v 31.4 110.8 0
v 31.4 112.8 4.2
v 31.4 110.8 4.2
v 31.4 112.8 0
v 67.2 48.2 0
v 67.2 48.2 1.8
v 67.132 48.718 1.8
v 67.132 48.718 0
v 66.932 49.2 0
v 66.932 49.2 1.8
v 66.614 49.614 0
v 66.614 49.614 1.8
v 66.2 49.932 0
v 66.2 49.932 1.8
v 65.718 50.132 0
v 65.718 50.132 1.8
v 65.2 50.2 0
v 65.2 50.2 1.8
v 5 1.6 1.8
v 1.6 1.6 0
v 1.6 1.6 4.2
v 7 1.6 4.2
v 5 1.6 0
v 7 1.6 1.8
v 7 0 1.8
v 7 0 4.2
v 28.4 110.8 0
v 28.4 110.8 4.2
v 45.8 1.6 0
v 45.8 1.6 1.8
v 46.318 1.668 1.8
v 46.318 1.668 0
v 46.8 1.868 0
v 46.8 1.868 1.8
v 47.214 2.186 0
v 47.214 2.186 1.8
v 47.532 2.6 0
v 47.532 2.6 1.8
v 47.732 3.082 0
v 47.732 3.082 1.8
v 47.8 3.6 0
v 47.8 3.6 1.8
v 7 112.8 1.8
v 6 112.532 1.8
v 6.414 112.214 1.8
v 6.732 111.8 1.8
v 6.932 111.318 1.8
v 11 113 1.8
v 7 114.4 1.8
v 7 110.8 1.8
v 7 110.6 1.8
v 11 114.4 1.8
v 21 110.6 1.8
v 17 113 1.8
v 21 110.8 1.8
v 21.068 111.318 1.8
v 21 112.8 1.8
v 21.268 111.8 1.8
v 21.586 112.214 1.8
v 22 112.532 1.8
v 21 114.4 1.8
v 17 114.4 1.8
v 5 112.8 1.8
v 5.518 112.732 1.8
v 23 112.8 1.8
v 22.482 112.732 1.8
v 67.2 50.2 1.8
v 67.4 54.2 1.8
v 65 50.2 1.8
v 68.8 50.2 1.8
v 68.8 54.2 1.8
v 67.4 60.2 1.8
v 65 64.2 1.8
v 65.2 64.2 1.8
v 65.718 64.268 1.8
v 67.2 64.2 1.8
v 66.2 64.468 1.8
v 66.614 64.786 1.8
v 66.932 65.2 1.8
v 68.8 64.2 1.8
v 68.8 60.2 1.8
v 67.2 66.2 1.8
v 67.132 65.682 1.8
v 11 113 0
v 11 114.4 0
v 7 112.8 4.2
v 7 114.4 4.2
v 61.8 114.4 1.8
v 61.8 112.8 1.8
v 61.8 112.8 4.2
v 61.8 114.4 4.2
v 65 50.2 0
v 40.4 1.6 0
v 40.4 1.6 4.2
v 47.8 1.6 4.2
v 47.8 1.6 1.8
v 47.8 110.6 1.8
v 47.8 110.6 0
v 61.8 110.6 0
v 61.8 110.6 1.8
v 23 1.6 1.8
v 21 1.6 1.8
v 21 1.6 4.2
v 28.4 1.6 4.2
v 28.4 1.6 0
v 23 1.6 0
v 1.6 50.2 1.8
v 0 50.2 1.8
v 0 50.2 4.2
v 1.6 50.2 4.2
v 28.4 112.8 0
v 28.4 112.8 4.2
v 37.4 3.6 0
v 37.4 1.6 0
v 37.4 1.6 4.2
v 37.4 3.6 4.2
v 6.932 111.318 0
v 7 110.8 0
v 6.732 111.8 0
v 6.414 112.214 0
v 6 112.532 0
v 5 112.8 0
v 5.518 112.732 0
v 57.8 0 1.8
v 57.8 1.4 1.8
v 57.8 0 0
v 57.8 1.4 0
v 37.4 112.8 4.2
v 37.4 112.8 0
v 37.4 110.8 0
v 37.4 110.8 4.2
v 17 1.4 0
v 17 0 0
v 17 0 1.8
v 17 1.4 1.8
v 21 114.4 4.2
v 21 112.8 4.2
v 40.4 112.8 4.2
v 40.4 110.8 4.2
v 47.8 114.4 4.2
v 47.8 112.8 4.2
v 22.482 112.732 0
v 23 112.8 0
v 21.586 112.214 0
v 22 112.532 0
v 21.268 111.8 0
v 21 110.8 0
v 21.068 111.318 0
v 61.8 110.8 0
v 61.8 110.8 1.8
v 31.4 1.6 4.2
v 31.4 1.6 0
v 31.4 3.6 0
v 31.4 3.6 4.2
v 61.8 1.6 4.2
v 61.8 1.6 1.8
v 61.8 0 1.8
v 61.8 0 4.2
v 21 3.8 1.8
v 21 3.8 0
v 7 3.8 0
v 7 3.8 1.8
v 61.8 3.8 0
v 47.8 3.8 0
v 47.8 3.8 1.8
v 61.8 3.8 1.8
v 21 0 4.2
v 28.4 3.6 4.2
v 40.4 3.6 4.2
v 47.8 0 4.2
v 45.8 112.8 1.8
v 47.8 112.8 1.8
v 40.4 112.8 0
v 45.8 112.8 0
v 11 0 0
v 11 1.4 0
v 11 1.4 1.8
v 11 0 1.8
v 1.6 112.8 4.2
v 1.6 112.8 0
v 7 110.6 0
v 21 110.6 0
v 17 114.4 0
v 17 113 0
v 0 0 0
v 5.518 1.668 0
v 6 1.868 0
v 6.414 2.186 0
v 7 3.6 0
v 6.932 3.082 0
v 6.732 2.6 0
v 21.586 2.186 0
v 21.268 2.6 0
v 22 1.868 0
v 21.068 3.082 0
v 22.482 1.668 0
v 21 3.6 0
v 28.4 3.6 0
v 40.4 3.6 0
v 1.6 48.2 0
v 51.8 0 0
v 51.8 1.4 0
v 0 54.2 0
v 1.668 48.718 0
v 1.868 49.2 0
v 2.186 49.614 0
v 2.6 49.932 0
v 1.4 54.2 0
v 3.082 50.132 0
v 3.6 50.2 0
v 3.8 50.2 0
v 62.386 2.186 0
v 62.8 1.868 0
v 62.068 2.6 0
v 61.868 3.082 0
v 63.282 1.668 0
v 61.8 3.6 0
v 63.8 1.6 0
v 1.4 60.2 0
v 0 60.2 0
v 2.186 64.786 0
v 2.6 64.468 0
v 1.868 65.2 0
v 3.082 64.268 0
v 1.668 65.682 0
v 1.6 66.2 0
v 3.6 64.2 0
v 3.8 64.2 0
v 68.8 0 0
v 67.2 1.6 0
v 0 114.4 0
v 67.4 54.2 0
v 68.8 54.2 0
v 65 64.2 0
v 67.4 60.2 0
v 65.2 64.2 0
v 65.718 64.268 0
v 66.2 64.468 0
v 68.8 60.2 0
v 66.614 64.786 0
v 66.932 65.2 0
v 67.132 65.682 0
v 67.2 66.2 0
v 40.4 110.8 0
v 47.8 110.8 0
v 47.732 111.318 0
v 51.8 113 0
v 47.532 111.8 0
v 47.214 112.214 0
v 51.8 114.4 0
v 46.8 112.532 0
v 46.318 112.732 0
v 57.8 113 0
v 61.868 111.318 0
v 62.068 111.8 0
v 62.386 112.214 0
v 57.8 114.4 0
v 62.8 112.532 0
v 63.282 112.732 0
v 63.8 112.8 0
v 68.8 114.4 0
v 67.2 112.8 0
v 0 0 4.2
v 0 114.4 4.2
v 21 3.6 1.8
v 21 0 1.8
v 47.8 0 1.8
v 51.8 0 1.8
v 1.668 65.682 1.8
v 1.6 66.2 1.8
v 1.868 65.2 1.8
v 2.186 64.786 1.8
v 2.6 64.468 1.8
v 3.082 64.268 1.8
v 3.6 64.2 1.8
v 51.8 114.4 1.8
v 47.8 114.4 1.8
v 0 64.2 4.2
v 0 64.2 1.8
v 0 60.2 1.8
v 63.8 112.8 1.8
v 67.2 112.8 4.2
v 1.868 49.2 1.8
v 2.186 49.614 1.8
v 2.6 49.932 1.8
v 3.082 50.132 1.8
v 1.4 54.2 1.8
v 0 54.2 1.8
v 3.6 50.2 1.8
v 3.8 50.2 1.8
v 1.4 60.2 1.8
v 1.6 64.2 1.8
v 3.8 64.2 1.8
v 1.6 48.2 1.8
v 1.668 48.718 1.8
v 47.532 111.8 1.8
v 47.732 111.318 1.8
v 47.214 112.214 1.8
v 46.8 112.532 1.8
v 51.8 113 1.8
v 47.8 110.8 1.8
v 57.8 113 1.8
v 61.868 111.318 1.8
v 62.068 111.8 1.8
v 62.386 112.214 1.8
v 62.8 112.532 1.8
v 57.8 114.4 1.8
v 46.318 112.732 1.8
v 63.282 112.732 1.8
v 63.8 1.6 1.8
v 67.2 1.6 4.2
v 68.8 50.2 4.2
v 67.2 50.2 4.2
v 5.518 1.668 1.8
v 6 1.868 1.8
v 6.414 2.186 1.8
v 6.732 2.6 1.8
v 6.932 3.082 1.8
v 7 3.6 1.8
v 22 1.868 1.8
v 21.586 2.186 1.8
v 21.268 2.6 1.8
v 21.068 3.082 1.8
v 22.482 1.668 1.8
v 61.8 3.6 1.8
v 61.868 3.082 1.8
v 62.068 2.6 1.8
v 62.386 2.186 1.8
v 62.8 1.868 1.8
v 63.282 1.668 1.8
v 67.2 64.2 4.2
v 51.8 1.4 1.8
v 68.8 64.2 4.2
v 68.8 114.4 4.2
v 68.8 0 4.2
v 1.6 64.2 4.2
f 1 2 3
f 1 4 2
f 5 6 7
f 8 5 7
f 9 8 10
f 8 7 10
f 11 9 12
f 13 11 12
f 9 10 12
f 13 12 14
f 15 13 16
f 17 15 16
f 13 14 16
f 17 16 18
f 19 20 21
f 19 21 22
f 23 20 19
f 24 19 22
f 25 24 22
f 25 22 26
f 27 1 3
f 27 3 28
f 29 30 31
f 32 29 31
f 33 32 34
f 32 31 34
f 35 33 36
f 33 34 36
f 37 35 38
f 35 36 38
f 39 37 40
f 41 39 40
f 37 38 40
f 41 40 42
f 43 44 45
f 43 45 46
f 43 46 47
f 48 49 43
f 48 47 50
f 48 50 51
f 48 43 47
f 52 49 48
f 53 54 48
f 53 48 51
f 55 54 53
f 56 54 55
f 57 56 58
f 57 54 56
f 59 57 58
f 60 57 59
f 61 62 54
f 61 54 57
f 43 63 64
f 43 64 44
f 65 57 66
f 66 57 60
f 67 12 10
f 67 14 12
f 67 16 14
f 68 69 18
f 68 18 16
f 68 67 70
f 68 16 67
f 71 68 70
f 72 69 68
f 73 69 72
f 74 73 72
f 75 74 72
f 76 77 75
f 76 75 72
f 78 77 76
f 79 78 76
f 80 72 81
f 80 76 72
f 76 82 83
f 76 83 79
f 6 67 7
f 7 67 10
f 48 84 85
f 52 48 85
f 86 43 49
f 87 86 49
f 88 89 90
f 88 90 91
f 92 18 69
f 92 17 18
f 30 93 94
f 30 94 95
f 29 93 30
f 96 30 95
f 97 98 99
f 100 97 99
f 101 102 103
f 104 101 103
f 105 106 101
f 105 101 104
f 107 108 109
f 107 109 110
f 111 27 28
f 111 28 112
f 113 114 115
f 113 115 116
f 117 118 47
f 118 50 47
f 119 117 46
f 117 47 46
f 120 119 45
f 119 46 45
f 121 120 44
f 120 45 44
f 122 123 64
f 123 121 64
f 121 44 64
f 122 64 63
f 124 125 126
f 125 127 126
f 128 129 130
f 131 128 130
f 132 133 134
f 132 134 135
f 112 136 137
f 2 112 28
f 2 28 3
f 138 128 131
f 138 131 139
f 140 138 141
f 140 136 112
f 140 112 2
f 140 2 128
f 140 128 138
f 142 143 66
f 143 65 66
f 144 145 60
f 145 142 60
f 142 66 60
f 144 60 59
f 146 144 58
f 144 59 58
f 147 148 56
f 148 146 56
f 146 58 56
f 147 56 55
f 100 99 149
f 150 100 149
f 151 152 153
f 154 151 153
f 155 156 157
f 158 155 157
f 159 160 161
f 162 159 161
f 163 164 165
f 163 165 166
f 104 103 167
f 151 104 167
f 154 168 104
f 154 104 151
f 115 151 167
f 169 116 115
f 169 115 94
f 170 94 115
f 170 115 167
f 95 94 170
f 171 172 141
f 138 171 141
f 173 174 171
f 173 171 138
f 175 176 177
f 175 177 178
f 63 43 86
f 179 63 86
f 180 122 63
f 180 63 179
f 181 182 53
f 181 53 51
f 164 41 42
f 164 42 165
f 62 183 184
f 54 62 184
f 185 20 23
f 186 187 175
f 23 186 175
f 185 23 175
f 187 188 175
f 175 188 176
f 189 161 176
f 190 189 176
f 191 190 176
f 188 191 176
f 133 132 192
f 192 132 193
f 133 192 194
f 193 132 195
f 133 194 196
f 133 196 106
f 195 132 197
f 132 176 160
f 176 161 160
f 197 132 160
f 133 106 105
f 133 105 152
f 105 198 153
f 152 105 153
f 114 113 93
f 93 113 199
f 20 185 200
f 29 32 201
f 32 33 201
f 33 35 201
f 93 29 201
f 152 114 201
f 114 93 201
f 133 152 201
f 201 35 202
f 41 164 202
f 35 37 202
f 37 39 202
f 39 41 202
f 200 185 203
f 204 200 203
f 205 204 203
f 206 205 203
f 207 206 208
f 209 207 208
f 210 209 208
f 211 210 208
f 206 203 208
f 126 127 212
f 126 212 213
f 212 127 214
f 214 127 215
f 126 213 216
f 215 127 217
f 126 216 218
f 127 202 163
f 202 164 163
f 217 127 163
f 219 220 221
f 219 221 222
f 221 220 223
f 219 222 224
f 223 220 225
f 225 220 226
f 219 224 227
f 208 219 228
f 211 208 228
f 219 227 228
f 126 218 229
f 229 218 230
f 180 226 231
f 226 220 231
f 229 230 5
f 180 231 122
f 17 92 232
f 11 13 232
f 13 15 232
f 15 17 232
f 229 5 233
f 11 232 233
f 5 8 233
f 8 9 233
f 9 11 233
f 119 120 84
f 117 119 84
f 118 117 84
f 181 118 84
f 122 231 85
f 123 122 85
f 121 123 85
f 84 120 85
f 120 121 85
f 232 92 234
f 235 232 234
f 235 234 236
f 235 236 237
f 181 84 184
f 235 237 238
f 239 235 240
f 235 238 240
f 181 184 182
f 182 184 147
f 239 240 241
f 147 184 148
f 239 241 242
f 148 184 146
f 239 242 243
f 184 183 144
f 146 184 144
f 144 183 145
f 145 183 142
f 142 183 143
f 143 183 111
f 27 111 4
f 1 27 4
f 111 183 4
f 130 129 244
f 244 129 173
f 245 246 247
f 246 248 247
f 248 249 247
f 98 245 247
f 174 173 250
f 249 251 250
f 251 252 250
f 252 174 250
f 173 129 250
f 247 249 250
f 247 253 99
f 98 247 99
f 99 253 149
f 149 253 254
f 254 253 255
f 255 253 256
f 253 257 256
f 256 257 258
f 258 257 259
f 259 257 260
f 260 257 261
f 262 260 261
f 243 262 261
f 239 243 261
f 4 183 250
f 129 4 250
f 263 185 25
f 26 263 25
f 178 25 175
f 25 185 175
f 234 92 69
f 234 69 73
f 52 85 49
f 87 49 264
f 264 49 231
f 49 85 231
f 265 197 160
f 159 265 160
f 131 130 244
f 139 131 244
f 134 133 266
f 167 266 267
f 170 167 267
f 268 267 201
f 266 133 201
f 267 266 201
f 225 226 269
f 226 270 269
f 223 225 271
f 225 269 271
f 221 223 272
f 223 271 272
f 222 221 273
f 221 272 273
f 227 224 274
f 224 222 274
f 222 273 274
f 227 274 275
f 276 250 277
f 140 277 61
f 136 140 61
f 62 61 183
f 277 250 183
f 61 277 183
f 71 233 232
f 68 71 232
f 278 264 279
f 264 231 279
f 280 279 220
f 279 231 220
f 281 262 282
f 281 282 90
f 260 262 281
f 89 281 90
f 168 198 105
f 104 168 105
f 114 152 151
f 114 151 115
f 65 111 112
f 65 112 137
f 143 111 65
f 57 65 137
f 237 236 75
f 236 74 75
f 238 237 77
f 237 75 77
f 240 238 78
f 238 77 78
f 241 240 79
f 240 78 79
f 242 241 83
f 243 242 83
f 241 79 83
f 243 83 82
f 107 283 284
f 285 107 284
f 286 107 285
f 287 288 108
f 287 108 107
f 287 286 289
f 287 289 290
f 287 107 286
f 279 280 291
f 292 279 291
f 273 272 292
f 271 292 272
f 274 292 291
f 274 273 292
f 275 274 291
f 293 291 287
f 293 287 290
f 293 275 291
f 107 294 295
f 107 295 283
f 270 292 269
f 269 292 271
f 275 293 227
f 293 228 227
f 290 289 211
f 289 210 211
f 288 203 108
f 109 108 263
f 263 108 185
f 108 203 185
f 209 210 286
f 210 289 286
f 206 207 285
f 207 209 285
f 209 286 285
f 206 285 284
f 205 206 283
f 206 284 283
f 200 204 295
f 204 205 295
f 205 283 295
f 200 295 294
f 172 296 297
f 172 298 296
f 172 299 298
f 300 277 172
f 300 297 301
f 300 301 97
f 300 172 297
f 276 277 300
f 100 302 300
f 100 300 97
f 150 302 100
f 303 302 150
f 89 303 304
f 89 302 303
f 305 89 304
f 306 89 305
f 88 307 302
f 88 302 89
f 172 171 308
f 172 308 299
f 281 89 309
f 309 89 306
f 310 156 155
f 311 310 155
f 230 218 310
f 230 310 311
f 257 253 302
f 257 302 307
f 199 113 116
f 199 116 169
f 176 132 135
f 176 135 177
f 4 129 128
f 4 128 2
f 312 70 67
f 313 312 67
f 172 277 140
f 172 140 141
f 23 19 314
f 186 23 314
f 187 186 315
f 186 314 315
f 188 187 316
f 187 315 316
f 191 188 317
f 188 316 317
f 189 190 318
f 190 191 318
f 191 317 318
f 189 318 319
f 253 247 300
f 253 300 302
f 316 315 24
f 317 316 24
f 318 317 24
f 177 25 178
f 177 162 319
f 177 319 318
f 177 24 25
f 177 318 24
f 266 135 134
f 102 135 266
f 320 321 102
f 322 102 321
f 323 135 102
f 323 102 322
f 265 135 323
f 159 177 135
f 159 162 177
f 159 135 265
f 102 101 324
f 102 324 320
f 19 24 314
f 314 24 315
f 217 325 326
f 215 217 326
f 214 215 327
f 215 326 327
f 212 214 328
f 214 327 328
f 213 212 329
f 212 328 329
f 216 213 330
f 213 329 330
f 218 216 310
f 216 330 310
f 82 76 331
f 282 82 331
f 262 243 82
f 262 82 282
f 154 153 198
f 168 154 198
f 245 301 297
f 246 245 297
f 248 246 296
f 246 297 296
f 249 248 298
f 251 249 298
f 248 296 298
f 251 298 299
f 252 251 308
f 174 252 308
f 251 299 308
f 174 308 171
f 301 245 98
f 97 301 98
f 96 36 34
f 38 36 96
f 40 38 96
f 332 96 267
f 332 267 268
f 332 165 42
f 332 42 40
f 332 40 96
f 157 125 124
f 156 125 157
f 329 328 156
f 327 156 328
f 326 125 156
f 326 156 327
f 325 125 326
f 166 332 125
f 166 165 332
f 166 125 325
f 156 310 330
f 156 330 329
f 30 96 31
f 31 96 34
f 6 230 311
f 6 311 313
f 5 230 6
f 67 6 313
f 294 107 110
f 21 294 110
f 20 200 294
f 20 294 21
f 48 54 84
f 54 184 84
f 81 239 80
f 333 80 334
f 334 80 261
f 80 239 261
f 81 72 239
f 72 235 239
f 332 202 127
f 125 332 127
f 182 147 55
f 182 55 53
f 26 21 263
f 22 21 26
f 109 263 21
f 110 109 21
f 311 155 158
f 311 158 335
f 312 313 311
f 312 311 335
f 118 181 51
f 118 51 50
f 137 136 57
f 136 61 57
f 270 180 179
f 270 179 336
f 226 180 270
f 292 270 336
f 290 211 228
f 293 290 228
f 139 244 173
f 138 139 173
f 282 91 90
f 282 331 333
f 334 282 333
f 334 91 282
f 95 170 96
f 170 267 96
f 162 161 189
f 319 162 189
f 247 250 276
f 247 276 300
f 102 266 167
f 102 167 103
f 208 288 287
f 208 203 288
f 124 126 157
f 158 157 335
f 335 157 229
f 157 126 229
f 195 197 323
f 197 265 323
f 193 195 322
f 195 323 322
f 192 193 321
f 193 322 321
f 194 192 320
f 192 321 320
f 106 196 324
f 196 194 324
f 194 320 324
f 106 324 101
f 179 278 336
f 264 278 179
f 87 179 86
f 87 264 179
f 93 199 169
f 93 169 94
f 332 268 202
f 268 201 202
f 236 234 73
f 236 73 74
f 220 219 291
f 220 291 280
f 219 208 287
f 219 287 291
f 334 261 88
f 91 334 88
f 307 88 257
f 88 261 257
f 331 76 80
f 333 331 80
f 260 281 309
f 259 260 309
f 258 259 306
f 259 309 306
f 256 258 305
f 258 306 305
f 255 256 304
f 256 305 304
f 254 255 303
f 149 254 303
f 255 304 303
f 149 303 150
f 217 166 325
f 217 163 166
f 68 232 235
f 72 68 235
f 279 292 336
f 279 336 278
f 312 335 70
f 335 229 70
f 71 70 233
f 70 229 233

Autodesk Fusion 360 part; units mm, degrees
sketch "Sketch1" plane through (0, 0, 0) normal (0, 0, 1) x (1, 0, 0)
  line L0 (21, 0) -> (21, 3.8)
  line L1 (21, 3.8) -> (7, 3.8)
  line L2 (7, 3.8) -> (7, 0)
  line L3 (17, 0) -> (17, 1.4)
  line L4 (17, 1.4) -> (11, 1.4)
  line L5 (11, 1.4) -> (11, 0)
  line L6 (0, 57.2) -> (68.8, 57.2) construction
  line L7 (34.4, 114.4) -> (34.4, 0) construction
  line L8 (47.8, 0) -> (47.8, 3.8)
  line L9 (47.8, 3.8) -> (61.8, 3.8)
  line L10 (61.8, 3.8) -> (61.8, 0)
  line L11 (51.8, 1.4) -> (57.8, 1.4)
  line L12 (57.8, 1.4) -> (57.8, 0)
  line L13 (51.8, 0) -> (51.8, 1.4)
  line L14 (7, 110.6) -> (7, 114.4)
  line L15 (21, 110.6) -> (7, 110.6)
  line L16 (21, 114.4) -> (21, 110.6)
  line L17 (17, 113) -> (11, 113)
  line L18 (11, 113) -> (11, 114.4)
  line L19 (17, 114.4) -> (17, 113)
  line L20 (47.8, 114.4) -> (47.8, 110.6)
  line L21 (47.8, 110.6) -> (61.8, 110.6)
  line L22 (51.8, 113) -> (57.8, 113)
  line L23 (51.8, 114.4) -> (51.8, 113)
  line L24 (57.8, 113) -> (57.8, 114.4)
  line L25 (61.8, 110.6) -> (61.8, 114.4)
  line L26 (68.8, 54.2) -> (67.4, 54.2)
  line L27 (67.4, 54.2) -> (67.4, 60.2)
  line L28 (67.4, 60.2) -> (68.8, 60.2)
  line L29 (68.8, 50.2) -> (65, 50.2)
  line L30 (65, 50.2) -> (65, 64.2)
  line L31 (65, 64.2) -> (68.8, 64.2)
  line L32 (3.8, 64.2) -> (0, 64.2)
  line L33 (3.8, 50.2) -> (3.8, 64.2)
  line L34 (0, 50.2) -> (3.8, 50.2)
  line L35 (0, 54.2) -> (1.4, 54.2)
  line L36 (1.4, 54.2) -> (1.4, 60.2)
  line L37 (1.4, 60.2) -> (0, 60.2)
  line L38 (7, 0) -> (11, 0)
  line L39 (17, 0) -> (21, 0)
  line L40 (0, 0) -> (11, 0)
  line L41 (17, 0) -> (51.8, 0)
  line L42 (57.8, 0) -> (68.8, 0)
  line L43 (68.8, 0) -> (68.8, 54.2)
  line L44 (68.8, 60.2) -> (68.8, 114.4)
  line L45 (68.8, 64.2) -> (68.8, 60.2)
  line L46 (68.8, 54.2) -> (68.8, 50.2)
  line L47 (0, 114.4) -> (0, 60.2)
  line L48 (0, 54.2) -> (0, 0)
  line L49 (11, 114.4) -> (0, 114.4)
  line L50 (68.8, 114.4) -> (57.8, 114.4)
  line L51 (51.8, 114.4) -> (17, 114.4)
  line L52 (18.6, 1.6) -> (50.2, 1.6)
  line L53 (50.2, 1.6) -> (50.2, 3)
  line L54 (50.2, 3) -> (59.4, 3)
  line L55 (59.4, 3) -> (59.4, 1.6)
  line L56 (59.4, 1.6) -> (67.2, 1.6)
  line L57 (67.2, 1.6) -> (67.2, 52.6)
  line L58 (67.2, 52.6) -> (65.8, 52.6)
  line L59 (65.8, 52.6) -> (65.8, 61.8)
  line L60 (65.8, 61.8) -> (67.2, 61.8)
  line L61 (67.2, 61.8) -> (67.2, 112.8)
  line L62 (67.2, 112.8) -> (59.4, 112.8)
  line L63 (18.6, 1.6) -> (18.6, 3)
  line L64 (18.6, 3) -> (9.4, 3)
  line L65 (9.4, 3) -> (9.4, 1.6)
  line L66 (8.5, 1.6) -> (9.4, 1.6)
  line L67 (1.6, 52.6) -> (1.6, 1.6)
  line L68 (1.6, 1.6) -> (9.4, 1.6)
  line L69 (1.6, 52.6) -> (3, 52.6)
  line L70 (3, 52.6) -> (3, 61.8)
  line L71 (3, 61.8) -> (1.6, 61.8)
  line L72 (1.6, 112.8) -> (1.6, 61.8)
  line L73 (67.2, 112.8) -> (59.4, 112.8)
  line L74 (59.4, 111.4) -> (59.4, 112.8)
  line L75 (50.2, 111.4) -> (59.4, 111.4)
  line L76 (50.2, 112.8) -> (50.2, 111.4)
  line L77 (50.2, 112.8) -> (18.6, 112.8)
  line L78 (18.6, 112.8) -> (18.6, 111.4)
  line L79 (18.6, 111.4) -> (9.4, 111.4)
  line L80 (9.4, 111.4) -> (9.4, 112.8)
  line L81 (9.4, 112.8) -> (1.6, 112.8)
  line L82 (22.6, 114.4) -> (22.6, 109)
  line L83 (22.6, 109) -> (5.4, 109)
  line L84 (5.4, 109) -> (5.4, 114.4)
  line L85 (46.2, 114.4) -> (46.2, 109)
  line L86 (46.2, 109) -> (63.4, 109)
  line L87 (63.4, 109) -> (63.4, 114.4)
  line L88 (68.8, 48.6) -> (63.4, 48.6)
  line L89 (63.4, 48.6) -> (63.4, 65.8)
  line L90 (63.4, 65.8) -> (68.8, 65.8)
  line L91 (46.2, 0) -> (46.2, 5.4)
  line L92 (46.2, 5.4) -> (63.4, 5.4)
  line L93 (63.4, 5.4) -> (63.4, 0)
  line L94 (22.6, 0) -> (22.6, 5.4)
  line L95 (22.6, 5.4) -> (5.4, 5.4)
  line L96 (5.4, 5.4) -> (5.4, 0)
  line L97 (0, 48.6) -> (5.4, 48.6)
  line L98 (5.4, 48.6) -> (5.4, 65.8)
  line L99 (5.4, 65.8) -> (0, 65.8)
  line L100 (1.6, 29.4948) -> (3.6, 29.4948)
  line L101 (3.6, 29.4948) -> (3.6, 26.4948)
  line L102 (3.6, 26.4948) -> (1.6, 26.4948)
  line L103 (1.6, 26.4948) -> (1.6, 29.4948)
  line L104 (67.2, 29.4948) -> (65.2, 29.4948)
  line L105 (65.2, 29.4948) -> (65.2, 26.4948)
  line L106 (65.2, 26.4948) -> (67.2, 26.4948)
  line L107 (67.2, 84.9052) -> (65.2, 84.9052)
  line L108 (65.2, 84.9052) -> (65.2, 87.9052)
  line L109 (65.2, 87.9052) -> (67.2, 87.9052)
  line L110 (3.6, 84.9052) -> (3.6, 87.9052)
  line L111 (1.6, 84.9052) -> (3.6, 84.9052)
  line L112 (3.6, 87.9052) -> (1.6, 87.9052)
  line L113 (28.4, 112.8) -> (31.4, 112.8)
  line L114 (31.4, 112.8) -> (31.4, 110.8)
  line L115 (31.4, 110.8) -> (28.4, 110.8)
  line L116 (28.4, 110.8) -> (28.4, 112.8)
  line L117 (28.4, 3.6) -> (28.4, 1.6)
  line L118 (31.4, 3.6) -> (28.4, 3.6)
  line L119 (31.4, 1.6) -> (31.4, 3.6)
  line L120 (37.4, 110.8) -> (40.4, 110.8)
  line L121 (40.4, 110.8) -> (40.4, 112.8)
  line L122 (37.4, 112.8) -> (37.4, 110.8)
  line L123 (37.4, 1.6) -> (37.4, 3.6)
  line L124 (37.4, 3.6) -> (40.4, 3.6)
  line L125 (40.4, 3.6) -> (40.4, 1.6)
  point P0 (14, 0)
  point P1 (14, 0)
  point P2 (7, 0)
  point P3 (14, 0)
  point P4 (68.8, 50.2)
  dimension "d10" = 68.8
  dimension "d11" = 114.4
  dimension "d12" = 14
  dimension "d13" = 7
  dimension "d14" = 3
  dimension "d15" = 14
  dimension "d16" = 3.8
  dimension "d17" = 6
  dimension "d18" = 1.4
  dimension "d19" = 3
  dimension "d20" = 7
  dimension "d21" = 1.4
  dimension "d22" = 6
  dimension "d23" = 3.8
  dimension "d24" = 14
  dimension "d30" = -1.6
  dimension "d31" = 1.6
  dimension "d32" = -1.6
  dimension "d33" = -1.6
  dimension "d34" = 1.6
  dimension "d35" = 1.6
  dimension "d36" = 2
  dimension "d37" = 3
  dimension "d38" = 3
  dimension "d39" = 2
  dimension "d40" = 6
extrude "Extrude1" add sketch "Sketch1" along normal blind 4.2 contours L0 L41 L52 L94 | L41 L52 L91 L94 | L8 L41 L52 L91 | L52 L117 L118 L119 | L2 L40 L68 L96 | L52 L123 L124 L125 | L40 L48 L67 L68 L96 L97 L103 | L10 L42 L56 L93 | L42 L43 L56 L57 L88 L93 | L34 L48 L67 L97 | L29 L43 L57 L88 | L47 L49 L72 L81 L84 L99 | L32 L47 L72 L99 | L31 L44 L61 L90 | L44 L50 L61 L62 L73 L87 L90 | L14 L49 L81 L84 | L25 L50 L62 L73 L87 | L51 L77 L82 L85 L113 | L16 L51 L77 L82 | L77 L113 L114 L115 L116 | L20 L51 L77 L85 | L77 L120 L121 L122 makes body 1 at (29.9333, 0, 2.8) makes body 2 at (68.8, 16.7333, 2.8) makes body 3 at (0, 33.4667, 2.8) makes body 4 at (38.8667, 114.4, 1.4) makes body 5 at (68.8, 80.9333, 1.4) makes body 6 at (0, 97.6667, 1.4)
extrude "Extrude2" add sketch "Sketch1" along normal blind 1.8 contours L0 L2 L3 L4 L5 L38 L39 L40 L41 L52 L63 L64 L65 L66 L68 | L0 L1 L2 L52 L63 L64 L65 L66 L68 | L8 L10 L11 L12 L13 L41 L42 L52 L53 L54 L55 L56 | L8 L9 L10 L52 L53 L54 L55 L56 | L32 L34 L35 L36 L37 L47 L48 L67 L69 L70 L71 L72 | L32 L33 L34 L67 L69 L70 L71 L72 | L26 L27 L28 L29 L31 L43 L44 L45 L46 L57 L58 L59 L60 L61 | L29 L30 L31 L57 L58 L59 L60 L61 | L14 L16 L17 L18 L19 L49 L51 L77 L78 L79 L80 L81 | L14 L15 L16 L77 L78 L79 L80 L81 | L20 L22 L23 L24 L25 L50 L51 L62 L73 L74 L75 L76 L77 | L20 L21 L25 L62 L73 L74 L75 L76 L77 bodies 1 5 2 4 3 6
fillet "Fillet1" radius 2 4 edges at (7, 112.8, 0.9) (21, 112.8, 0.9) (47.8, 112.8, 0.9) (61.8, 112.8, 0.9) on bodies 1
fillet "Fillet1" radius 2 8 edges at (61.8, 1.6, 0.9) (21, 1.6, 0.9) (67.2, 64.2, 0.9) (47.8, 1.6, 0.9) (7, 1.6, 0.9) (67.2, 50.2, 0.9) (1.6, 50.2, 0.9) (1.6, 64.2, 0.9) on bodies 1
ref_plane "WorkPlane1" through (0, 57.2, 0) normal (0, 1, 0) x (0, 0, 1)
equation "width = 68.8 mm"
equation "height = 114.4 mm"
equation "depth = 4.2 mm"
equation "inner_depth = 1.6 mm"
equation "insets_width = 14 mm"
equation "insets_height = 3.8 mm"
equation "insets_niche_depth = 1.4 mm"
equation "insets_niche_width = 6 mm"
equation "insets_topbot_center_from_edge = 14 mm"
equation "d10 = width"
equation "d11 = height"
equation "d12 = insets_topbot_center_from_edge"
equation "d13 = insets_width / 2"
equation "d14 = insets_niche_width / 2"
equation "d15 = insets_width"
equation "d16 = insets_height"
equation "d17 = insets_niche_width"
equation "d18 = insets_niche_depth"
equation "d19 = insets_niche_width / 2"
equation "d20 = insets_width / 2"
equation "d21 = insets_niche_depth"
equation "d22 = insets_niche_width"
equation "d23 = insets_height"
equation "d24 = insets_width"
equation "d41 = depth"
equation "d49 = height / 2"
